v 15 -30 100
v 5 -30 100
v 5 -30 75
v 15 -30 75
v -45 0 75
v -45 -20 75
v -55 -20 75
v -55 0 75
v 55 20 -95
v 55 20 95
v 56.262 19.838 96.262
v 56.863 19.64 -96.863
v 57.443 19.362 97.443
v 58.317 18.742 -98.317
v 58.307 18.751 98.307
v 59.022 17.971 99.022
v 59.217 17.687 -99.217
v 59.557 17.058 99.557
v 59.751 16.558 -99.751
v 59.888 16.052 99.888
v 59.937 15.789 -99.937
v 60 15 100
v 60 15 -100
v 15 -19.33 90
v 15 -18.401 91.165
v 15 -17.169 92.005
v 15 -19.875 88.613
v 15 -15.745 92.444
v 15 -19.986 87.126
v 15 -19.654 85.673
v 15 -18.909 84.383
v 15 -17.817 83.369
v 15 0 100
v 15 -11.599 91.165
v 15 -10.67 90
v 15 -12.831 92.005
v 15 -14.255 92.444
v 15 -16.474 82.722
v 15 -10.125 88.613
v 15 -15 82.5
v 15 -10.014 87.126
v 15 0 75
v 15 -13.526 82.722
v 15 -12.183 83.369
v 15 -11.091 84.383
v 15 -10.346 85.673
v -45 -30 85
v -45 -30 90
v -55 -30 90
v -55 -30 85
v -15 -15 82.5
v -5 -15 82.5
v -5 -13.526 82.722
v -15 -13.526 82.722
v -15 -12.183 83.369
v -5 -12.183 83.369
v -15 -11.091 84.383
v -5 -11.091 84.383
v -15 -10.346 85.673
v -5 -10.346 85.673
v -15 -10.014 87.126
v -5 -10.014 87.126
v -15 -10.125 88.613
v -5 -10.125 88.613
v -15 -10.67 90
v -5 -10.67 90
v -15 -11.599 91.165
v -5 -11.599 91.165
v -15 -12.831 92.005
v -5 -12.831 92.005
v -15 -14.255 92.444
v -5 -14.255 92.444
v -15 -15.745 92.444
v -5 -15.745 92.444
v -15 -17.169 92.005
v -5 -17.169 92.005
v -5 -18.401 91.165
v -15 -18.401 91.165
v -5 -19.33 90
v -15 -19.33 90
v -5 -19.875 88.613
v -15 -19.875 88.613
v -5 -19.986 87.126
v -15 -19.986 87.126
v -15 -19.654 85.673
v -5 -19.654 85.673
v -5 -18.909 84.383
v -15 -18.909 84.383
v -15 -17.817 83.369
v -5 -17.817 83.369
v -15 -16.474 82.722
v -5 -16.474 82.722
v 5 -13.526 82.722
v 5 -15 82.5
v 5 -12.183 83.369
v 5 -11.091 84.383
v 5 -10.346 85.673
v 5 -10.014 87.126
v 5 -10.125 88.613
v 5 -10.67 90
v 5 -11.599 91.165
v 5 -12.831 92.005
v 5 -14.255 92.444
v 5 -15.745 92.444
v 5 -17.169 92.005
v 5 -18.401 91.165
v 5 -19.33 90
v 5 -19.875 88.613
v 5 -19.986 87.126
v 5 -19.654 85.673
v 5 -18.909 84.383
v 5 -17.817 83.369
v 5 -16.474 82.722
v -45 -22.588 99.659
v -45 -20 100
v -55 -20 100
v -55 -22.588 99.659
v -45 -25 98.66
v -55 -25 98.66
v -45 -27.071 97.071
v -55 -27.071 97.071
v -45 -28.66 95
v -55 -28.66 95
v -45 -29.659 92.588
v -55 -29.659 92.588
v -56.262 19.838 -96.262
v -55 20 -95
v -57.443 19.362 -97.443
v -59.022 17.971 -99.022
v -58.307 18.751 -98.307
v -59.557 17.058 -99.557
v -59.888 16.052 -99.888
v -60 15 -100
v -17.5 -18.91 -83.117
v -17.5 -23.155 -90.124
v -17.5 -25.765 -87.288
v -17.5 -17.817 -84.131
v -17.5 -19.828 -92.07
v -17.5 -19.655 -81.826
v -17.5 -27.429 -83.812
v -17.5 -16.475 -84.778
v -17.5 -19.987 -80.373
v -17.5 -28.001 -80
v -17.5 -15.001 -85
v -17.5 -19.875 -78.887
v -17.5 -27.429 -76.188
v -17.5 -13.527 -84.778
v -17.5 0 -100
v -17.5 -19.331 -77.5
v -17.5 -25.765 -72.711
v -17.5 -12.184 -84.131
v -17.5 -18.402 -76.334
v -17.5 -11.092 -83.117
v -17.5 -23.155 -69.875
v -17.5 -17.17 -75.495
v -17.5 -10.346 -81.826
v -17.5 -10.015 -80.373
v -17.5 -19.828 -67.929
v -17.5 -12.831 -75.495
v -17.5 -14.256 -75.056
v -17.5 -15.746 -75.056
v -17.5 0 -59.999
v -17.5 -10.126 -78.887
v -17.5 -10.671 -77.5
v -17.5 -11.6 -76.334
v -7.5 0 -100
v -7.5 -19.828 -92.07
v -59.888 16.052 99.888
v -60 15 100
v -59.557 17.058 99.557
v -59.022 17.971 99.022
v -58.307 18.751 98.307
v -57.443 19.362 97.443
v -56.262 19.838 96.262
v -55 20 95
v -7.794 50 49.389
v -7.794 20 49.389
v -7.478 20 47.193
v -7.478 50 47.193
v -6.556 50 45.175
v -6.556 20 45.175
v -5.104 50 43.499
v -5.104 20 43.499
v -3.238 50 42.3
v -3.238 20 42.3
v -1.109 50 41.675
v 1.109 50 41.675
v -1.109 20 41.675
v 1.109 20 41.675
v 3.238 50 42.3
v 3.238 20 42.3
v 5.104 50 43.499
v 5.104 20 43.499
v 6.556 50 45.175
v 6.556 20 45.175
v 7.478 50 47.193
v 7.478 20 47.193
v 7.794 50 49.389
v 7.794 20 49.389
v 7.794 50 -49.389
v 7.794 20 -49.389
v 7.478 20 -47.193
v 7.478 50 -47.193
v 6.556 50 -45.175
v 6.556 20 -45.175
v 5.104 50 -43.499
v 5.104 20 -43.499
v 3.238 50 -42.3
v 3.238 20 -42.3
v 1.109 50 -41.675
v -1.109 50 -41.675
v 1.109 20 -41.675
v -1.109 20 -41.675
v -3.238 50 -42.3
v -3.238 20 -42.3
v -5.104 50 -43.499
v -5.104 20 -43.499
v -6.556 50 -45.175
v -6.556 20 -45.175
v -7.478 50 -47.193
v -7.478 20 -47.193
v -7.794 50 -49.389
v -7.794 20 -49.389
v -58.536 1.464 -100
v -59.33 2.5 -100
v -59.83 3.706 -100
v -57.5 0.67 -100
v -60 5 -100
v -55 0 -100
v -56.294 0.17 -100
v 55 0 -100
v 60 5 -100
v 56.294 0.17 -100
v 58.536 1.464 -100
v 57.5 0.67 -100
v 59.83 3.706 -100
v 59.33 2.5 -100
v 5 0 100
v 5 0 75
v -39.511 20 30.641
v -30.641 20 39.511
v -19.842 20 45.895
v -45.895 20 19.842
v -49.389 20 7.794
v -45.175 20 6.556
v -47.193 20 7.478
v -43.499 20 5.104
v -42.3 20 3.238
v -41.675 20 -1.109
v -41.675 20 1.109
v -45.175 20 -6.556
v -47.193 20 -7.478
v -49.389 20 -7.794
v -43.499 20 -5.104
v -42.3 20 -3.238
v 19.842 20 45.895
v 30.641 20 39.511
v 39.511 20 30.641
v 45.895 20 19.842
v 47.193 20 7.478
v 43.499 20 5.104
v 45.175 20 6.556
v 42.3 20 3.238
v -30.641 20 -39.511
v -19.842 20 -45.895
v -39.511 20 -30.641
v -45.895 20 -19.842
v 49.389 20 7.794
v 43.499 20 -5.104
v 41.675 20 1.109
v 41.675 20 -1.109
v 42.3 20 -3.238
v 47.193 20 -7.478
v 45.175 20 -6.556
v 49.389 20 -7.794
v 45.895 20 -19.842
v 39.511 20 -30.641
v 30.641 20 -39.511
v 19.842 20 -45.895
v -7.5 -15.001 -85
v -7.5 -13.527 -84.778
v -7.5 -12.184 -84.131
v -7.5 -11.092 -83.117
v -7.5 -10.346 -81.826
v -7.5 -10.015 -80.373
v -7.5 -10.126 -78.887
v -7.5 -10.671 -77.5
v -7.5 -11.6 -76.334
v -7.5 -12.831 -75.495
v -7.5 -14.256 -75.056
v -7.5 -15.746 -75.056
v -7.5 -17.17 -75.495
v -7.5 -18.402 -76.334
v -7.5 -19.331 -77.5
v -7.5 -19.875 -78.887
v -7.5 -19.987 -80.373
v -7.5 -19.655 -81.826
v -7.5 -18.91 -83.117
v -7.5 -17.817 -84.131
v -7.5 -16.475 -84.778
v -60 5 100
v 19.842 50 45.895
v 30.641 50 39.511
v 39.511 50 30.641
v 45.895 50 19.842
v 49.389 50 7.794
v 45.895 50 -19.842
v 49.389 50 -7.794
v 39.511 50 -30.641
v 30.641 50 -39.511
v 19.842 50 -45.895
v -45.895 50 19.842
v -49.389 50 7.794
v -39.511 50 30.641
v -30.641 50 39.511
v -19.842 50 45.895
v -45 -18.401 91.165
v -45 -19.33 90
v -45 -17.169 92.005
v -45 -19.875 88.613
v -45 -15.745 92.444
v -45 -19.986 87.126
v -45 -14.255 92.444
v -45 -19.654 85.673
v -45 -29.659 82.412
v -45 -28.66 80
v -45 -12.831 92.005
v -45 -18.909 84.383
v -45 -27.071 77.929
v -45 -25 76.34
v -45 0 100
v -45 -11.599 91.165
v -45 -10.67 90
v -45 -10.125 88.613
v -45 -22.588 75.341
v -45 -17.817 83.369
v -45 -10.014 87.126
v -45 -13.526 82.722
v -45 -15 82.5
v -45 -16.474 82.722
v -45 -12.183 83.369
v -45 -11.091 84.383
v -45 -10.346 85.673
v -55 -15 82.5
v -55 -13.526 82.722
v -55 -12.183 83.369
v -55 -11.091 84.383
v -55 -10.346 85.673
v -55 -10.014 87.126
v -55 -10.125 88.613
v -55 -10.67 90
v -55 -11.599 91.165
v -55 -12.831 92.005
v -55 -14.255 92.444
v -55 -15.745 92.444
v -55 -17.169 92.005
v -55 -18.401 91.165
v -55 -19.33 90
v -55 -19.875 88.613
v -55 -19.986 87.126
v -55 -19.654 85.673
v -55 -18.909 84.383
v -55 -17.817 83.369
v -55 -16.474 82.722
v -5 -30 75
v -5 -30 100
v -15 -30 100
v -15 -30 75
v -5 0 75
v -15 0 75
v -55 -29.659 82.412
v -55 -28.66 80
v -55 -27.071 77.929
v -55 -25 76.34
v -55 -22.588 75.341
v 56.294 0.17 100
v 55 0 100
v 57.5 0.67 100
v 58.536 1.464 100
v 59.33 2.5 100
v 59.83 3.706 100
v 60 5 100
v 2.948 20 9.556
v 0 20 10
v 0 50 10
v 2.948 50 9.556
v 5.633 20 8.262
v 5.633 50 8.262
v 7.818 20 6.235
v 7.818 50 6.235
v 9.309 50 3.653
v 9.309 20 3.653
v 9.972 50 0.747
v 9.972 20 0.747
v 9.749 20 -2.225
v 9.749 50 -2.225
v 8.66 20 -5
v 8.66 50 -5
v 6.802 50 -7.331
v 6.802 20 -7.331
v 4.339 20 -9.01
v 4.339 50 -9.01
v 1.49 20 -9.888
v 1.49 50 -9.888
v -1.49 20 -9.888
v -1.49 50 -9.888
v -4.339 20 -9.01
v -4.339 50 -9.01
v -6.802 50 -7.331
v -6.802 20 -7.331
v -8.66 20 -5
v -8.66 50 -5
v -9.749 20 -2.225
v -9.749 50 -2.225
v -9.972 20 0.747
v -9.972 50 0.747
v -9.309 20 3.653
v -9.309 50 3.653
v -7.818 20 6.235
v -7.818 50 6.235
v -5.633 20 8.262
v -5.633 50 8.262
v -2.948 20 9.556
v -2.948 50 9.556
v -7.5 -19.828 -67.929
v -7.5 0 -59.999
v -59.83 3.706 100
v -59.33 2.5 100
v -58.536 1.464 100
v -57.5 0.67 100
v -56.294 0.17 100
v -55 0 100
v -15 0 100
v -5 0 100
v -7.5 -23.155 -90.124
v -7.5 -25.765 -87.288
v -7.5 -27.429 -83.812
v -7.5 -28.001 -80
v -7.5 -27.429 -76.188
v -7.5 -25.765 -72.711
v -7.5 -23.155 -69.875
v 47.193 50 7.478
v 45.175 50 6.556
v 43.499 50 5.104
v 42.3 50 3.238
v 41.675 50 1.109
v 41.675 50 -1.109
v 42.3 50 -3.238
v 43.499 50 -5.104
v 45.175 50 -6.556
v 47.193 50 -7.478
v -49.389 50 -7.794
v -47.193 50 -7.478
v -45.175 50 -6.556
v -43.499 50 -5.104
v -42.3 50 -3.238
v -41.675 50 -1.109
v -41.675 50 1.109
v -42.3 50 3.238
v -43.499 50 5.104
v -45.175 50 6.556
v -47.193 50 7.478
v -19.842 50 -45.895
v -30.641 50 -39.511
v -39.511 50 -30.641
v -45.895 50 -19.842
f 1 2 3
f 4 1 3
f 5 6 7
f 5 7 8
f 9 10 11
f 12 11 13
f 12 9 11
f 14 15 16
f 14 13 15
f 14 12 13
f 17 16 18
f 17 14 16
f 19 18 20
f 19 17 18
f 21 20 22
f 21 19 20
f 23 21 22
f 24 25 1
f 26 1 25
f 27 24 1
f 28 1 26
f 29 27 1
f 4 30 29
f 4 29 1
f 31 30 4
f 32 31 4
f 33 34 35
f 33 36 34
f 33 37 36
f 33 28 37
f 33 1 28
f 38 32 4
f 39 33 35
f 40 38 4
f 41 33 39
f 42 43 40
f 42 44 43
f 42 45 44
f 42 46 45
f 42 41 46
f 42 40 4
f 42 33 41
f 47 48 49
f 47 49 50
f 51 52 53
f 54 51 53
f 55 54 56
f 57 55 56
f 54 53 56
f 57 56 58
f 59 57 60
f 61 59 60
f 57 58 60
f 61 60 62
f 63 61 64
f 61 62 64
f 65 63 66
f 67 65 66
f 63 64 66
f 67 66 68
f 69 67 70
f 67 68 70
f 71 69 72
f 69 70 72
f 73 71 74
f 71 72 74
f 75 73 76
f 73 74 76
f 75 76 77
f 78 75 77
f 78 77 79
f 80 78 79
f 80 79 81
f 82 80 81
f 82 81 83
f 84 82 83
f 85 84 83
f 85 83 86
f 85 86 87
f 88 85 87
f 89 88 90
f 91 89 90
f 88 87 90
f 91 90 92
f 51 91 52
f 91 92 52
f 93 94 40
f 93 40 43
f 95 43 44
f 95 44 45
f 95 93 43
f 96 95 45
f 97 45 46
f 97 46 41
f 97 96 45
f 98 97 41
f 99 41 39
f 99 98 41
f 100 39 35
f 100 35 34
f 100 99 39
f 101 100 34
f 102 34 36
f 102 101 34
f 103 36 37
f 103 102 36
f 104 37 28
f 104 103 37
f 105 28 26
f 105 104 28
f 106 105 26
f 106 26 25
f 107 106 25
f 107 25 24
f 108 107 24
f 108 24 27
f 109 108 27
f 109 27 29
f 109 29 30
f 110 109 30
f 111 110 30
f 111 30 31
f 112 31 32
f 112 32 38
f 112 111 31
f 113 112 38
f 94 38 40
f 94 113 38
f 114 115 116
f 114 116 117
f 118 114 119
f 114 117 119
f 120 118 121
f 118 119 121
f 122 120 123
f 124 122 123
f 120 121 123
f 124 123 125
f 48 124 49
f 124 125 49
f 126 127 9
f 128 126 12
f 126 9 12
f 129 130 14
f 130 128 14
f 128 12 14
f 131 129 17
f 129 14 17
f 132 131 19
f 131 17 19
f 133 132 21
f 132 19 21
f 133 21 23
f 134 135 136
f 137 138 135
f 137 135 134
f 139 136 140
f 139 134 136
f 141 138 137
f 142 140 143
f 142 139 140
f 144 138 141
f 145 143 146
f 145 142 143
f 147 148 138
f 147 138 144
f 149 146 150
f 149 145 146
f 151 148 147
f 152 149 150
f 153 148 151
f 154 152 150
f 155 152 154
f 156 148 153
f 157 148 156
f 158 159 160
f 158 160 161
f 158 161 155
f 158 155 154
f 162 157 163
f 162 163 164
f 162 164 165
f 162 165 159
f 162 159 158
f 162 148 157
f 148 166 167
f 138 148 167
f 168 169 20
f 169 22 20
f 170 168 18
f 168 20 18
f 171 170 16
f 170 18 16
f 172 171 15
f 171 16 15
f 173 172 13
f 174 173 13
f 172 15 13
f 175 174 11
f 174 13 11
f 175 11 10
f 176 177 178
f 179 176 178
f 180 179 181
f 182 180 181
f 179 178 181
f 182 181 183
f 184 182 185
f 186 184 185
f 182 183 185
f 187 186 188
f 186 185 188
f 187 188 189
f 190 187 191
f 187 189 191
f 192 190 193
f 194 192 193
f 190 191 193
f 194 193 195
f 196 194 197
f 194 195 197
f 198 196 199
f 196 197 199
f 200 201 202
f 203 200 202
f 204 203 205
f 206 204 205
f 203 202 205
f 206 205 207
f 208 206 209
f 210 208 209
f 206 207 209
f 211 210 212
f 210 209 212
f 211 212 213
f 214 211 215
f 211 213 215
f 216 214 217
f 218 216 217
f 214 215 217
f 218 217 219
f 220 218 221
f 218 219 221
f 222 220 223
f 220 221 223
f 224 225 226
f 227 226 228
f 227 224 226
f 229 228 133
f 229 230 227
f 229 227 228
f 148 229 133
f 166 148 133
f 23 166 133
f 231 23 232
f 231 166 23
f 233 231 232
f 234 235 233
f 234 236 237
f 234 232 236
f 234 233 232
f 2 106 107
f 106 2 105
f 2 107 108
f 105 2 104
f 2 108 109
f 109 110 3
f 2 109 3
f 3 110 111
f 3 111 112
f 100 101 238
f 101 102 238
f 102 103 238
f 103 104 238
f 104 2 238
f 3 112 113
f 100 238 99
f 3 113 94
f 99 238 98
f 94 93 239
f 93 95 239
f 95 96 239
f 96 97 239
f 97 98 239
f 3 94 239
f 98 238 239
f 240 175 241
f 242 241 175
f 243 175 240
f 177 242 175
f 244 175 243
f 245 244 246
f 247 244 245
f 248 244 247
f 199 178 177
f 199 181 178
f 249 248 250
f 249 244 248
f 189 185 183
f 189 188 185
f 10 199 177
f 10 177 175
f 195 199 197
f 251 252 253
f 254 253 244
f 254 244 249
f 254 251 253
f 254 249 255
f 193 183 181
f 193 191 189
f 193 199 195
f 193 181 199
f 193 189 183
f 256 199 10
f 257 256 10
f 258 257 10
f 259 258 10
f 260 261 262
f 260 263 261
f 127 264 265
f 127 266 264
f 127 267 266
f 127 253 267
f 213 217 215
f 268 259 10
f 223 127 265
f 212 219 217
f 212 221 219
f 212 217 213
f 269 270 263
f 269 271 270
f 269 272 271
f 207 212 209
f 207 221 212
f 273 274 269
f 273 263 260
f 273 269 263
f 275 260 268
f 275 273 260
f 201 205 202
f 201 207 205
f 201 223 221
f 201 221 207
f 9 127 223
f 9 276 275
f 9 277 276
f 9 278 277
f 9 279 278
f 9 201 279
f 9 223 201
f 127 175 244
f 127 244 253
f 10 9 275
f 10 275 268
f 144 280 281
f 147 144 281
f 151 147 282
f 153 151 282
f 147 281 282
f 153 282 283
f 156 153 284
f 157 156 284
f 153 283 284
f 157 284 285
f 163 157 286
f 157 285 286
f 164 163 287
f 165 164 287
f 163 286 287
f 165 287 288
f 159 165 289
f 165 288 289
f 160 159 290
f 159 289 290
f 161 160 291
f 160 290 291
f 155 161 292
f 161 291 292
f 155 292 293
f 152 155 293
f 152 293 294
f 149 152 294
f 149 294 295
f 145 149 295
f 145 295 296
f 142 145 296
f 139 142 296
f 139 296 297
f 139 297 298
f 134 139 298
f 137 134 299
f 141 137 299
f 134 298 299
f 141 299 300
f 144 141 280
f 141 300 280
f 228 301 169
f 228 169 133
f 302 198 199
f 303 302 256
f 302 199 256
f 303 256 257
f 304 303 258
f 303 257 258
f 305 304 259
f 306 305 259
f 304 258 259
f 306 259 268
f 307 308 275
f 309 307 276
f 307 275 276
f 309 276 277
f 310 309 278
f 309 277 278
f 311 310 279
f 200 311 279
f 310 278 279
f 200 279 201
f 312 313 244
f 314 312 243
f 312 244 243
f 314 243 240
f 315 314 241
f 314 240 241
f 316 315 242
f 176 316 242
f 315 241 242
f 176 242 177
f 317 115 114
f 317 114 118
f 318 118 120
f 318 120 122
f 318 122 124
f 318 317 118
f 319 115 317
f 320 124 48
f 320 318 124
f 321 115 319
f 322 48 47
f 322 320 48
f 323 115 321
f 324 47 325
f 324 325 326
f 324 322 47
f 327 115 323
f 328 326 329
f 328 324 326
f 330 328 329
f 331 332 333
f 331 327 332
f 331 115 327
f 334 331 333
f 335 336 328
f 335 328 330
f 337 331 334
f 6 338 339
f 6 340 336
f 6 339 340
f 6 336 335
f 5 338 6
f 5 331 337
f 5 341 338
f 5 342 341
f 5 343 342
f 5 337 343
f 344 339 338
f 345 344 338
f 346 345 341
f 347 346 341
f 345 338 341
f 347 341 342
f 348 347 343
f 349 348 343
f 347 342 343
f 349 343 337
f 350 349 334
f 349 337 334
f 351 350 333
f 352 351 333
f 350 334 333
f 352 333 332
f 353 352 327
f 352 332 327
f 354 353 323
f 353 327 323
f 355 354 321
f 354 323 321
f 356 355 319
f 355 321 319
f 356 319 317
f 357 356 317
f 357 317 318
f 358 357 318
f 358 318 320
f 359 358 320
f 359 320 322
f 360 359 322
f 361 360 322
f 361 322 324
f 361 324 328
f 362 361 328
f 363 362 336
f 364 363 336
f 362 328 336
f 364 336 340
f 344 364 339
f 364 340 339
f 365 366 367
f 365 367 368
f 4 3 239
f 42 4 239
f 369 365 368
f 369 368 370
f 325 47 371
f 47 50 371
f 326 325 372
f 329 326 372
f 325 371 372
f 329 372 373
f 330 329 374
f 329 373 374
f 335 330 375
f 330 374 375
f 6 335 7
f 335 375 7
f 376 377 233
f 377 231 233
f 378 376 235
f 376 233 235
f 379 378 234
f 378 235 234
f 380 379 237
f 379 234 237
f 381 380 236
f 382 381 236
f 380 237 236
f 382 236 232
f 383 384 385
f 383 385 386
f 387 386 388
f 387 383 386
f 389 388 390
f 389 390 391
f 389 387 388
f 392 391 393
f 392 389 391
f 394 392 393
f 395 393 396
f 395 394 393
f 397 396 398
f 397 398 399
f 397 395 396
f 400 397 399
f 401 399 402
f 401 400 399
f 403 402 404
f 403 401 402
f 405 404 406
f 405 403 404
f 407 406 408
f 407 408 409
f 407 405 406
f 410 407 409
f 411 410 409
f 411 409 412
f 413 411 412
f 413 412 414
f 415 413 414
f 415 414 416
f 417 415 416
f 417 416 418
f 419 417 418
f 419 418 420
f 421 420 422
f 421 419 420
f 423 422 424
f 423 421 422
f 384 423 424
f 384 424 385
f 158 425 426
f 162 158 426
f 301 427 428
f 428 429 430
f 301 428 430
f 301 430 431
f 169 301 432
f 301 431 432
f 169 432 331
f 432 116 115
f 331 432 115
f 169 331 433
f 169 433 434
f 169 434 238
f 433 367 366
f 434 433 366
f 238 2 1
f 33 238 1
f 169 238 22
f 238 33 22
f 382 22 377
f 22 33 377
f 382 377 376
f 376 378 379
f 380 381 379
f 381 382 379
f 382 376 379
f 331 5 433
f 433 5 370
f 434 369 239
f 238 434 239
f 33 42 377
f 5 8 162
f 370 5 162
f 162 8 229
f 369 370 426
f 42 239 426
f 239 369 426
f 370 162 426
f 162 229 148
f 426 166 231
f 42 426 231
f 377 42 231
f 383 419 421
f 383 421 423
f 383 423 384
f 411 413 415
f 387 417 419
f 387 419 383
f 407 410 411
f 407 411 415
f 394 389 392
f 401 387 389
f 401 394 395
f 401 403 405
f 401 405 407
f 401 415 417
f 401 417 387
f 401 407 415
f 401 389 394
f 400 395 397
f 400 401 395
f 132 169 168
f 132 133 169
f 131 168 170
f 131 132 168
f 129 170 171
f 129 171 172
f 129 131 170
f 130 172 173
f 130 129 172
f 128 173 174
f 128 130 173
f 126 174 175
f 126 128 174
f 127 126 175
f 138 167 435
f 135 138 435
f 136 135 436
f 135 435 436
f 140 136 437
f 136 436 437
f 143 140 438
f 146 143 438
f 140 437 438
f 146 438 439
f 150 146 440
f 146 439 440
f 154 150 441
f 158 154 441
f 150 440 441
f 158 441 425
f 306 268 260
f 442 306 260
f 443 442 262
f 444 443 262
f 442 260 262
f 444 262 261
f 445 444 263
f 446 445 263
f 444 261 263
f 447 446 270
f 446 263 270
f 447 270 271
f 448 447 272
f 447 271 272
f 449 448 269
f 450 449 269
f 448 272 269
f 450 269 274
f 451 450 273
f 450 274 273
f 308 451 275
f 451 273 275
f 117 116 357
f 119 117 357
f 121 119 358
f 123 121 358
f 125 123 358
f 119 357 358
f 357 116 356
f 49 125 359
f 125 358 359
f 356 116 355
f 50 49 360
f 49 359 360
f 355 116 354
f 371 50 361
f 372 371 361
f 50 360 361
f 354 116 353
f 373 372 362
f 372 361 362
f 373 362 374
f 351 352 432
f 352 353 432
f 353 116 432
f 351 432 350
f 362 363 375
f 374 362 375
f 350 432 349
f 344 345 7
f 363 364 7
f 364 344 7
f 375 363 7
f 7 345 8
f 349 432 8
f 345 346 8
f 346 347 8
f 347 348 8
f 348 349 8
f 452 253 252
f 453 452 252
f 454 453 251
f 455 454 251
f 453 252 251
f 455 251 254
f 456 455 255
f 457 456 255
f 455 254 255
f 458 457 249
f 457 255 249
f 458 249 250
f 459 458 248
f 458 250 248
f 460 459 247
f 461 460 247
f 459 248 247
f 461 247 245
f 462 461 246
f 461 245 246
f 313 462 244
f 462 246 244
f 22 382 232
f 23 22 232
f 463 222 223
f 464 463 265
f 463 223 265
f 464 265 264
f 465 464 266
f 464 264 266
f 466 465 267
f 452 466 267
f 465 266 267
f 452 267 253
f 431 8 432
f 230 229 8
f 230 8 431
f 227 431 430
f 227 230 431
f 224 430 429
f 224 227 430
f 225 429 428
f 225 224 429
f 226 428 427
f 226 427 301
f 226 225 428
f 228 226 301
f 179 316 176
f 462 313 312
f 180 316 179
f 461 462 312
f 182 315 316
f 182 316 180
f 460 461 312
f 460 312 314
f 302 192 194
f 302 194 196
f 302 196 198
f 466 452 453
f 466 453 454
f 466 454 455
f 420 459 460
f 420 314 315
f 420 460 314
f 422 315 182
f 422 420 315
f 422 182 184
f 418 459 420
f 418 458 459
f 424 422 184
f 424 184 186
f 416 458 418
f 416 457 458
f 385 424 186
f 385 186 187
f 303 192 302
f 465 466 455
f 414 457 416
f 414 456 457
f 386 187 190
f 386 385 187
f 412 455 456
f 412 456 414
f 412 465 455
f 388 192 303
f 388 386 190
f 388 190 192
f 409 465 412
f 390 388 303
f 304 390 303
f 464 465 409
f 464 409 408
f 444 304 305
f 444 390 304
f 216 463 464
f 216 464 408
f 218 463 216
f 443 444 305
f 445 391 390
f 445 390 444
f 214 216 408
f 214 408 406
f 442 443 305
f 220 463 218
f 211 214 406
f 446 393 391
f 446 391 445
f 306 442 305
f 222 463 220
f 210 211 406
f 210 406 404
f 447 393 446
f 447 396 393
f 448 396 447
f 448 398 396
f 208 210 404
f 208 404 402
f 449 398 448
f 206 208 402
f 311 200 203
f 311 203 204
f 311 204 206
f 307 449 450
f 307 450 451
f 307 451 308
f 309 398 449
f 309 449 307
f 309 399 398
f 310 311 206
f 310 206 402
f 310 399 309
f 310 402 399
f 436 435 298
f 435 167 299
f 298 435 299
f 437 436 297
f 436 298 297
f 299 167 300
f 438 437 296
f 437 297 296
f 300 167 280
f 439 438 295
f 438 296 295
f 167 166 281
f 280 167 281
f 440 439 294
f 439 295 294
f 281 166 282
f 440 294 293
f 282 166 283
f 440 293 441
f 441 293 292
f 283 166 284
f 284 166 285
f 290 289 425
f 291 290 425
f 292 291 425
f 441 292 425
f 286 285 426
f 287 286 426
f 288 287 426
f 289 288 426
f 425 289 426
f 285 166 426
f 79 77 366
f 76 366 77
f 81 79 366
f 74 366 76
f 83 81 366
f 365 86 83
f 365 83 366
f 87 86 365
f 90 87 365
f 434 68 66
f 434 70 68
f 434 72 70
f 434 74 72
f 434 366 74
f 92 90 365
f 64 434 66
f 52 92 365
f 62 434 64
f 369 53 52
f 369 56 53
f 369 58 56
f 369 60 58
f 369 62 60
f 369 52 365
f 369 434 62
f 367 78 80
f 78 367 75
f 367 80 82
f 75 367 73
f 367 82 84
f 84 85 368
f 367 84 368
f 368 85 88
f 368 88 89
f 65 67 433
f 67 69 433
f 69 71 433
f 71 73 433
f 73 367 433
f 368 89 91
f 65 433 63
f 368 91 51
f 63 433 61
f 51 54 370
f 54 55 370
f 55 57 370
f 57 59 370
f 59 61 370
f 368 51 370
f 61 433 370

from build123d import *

# Parameters (mm, degrees)
SKETCH_2_W      = 120
SKETCH_2_H      = 200
EXTRUDE_1_DEPTH = 20
EXTRUDE_START   = -7.5
SKETCH_3_R      = 5
EXTRUDE_2_DEPTH = 10
EXTRUDE_START_2 = 5
SKETCH_4_W      = 25
SKETCH_4_H      = 30
SKETCH_4_R      = 5
EXTRUDE_3_DEPTH = 10
EXTRUDE_START_3 = -45
SKETCH_4_2_W    = 25
SKETCH_4_2_H    = 30
SKETCH_4_2_R    = 5
EXTRUDE_4_DEPTH = 10
FILLET_2_R      = 10
FILLET_3_R      = 10
FILLET_4_R      = 5
SKETCH_5_R      = 10
EXTRUDE_5_DEPTH = 30


with BuildPart() as part:
    # 草图2 → 凸台-拉伸1 (new body)
    with BuildSketch(Plane(origin=(0, 0, 0), x_dir=(1, 0, 0), z_dir=(0, 1, 0))):
        Rectangle(SKETCH_2_W, SKETCH_2_H)
    extrude(amount=EXTRUDE_1_DEPTH)

    # 草图3 → 凸台-拉伸2 (add)
    with BuildSketch(Plane(origin=(0, 0, 0), x_dir=(0, 0, -1), z_dir=(1, 0, 0)).offset(EXTRUDE_START)):
        with BuildLine():
            Line((92.070196982, -19.828078793), (100, 0))
            Line((100, 0), (59.999006327, 0))
            Line((59.999006327, 0), (67.929286029, -19.828285561))
            ThreePointArc((67.929286029, -19.828285561), (79.999811504, -28.000749672), (92.070196982, -19.828078793))
        make_face()
        with Locations((79.999700158, -15.000749673)):
            Circle(SKETCH_3_R, mode=Mode.SUBTRACT)
    extrude(amount=-EXTRUDE_2_DEPTH)

    # 草图4 → 凸台-拉伸3 (add)
    with BuildSketch(Plane(origin=(0, 0, 0), x_dir=(0, 0, -1), z_dir=(1, 0, 0)).offset(EXTRUDE_START_2)):
        with Locations((-87.5, -15)):
            Rectangle(SKETCH_4_W, SKETCH_4_H)
        with Locations((-87.5, -15)):
            Circle(SKETCH_4_R, mode=Mode.SUBTRACT)
    extrude_3 = extrude(amount=EXTRUDE_3_DEPTH)

    # 镜向1: 凸台-拉伸3 across plane
    add(extrude_3.mirror(Plane(origin=(0, 0, 0), x_dir=(0, 0, 1), z_dir=(1, 0, 0))))

    # 草图4<2> → 凸台-拉伸4 (add)
    with BuildSketch(Plane(origin=(0, 0, 0), x_dir=(0, 0, -1), z_dir=(1, 0, 0)).offset(EXTRUDE_START_3)):
        with Locations((-87.5, -15)):
            Rectangle(SKETCH_4_2_W, SKETCH_4_2_H)
        with Locations((-87.5, -15)):
            Circle(SKETCH_4_2_R, mode=Mode.SUBTRACT)
    extrude(amount=-EXTRUDE_4_DEPTH)

    # 圆角2
    fillet_2_edges = [part.edges().sort_by_distance(p)[0] for p in [
        (-50, -30, 100),
    ]]
    fillet(fillet_2_edges, radius=FILLET_2_R)

    # 圆角3
    fillet_3_edges = [part.edges().sort_by_distance(p)[0] for p in [
        (-50, -30, 75),
    ]]
    fillet(fillet_3_edges, radius=FILLET_3_R)

    # 圆角4
    fillet_4_edges = [part.edges().sort_by_distance(p)[0] for p in [
        (60, 0, 0),
        (-60, 0, 0),
        (0, 20, 100),
        (-60, 20, 0),
        (0, 20, -100),
        (60, 20, 0),
    ]]
    fillet(fillet_4_edges, radius=FILLET_4_R)

    # 草图5 → 凸台-拉伸5 (add)
    with BuildSketch(Plane(origin=(0, 20, 0), x_dir=(1, 0, 0), z_dir=(0, 1, 0))):
        with BuildLine():
            ThreePointArc((49.388864588, -7.793590617), (41.595273971, 0), (49.388864588, 7.793590617))
            ThreePointArc((49.388864588, 7.793590617), (35.355339059, 35.355339059), (7.793590617, 49.388864588))
            ThreePointArc((7.793590617, 49.388864588), (0, 41.595273971), (-7.793590617, 49.388864588))
            ThreePointArc((-7.793590617, 49.388864588), (-35.355339059, 35.355339059), (-49.388864588, 7.793590617))
            ThreePointArc((-49.388864588, 7.793590617), (-41.595273971, 0), (-49.388864588, -7.793590617))
            ThreePointArc((-49.388864588, -7.793590617), (-35.355339059, -35.355339059), (-7.793590617, -49.388864588))
            ThreePointArc((-7.793590617, -49.388864588), (0, -41.595273971), (7.793590617, -49.388864588))
            ThreePointArc((7.793590617, -49.388864588), (35.355339059, -35.355339059), (49.388864588, -7.793590617))
        make_face()
        Circle(SKETCH_5_R, mode=Mode.SUBTRACT)
    extrude(amount=EXTRUDE_5_DEPTH)


solid = part.part
